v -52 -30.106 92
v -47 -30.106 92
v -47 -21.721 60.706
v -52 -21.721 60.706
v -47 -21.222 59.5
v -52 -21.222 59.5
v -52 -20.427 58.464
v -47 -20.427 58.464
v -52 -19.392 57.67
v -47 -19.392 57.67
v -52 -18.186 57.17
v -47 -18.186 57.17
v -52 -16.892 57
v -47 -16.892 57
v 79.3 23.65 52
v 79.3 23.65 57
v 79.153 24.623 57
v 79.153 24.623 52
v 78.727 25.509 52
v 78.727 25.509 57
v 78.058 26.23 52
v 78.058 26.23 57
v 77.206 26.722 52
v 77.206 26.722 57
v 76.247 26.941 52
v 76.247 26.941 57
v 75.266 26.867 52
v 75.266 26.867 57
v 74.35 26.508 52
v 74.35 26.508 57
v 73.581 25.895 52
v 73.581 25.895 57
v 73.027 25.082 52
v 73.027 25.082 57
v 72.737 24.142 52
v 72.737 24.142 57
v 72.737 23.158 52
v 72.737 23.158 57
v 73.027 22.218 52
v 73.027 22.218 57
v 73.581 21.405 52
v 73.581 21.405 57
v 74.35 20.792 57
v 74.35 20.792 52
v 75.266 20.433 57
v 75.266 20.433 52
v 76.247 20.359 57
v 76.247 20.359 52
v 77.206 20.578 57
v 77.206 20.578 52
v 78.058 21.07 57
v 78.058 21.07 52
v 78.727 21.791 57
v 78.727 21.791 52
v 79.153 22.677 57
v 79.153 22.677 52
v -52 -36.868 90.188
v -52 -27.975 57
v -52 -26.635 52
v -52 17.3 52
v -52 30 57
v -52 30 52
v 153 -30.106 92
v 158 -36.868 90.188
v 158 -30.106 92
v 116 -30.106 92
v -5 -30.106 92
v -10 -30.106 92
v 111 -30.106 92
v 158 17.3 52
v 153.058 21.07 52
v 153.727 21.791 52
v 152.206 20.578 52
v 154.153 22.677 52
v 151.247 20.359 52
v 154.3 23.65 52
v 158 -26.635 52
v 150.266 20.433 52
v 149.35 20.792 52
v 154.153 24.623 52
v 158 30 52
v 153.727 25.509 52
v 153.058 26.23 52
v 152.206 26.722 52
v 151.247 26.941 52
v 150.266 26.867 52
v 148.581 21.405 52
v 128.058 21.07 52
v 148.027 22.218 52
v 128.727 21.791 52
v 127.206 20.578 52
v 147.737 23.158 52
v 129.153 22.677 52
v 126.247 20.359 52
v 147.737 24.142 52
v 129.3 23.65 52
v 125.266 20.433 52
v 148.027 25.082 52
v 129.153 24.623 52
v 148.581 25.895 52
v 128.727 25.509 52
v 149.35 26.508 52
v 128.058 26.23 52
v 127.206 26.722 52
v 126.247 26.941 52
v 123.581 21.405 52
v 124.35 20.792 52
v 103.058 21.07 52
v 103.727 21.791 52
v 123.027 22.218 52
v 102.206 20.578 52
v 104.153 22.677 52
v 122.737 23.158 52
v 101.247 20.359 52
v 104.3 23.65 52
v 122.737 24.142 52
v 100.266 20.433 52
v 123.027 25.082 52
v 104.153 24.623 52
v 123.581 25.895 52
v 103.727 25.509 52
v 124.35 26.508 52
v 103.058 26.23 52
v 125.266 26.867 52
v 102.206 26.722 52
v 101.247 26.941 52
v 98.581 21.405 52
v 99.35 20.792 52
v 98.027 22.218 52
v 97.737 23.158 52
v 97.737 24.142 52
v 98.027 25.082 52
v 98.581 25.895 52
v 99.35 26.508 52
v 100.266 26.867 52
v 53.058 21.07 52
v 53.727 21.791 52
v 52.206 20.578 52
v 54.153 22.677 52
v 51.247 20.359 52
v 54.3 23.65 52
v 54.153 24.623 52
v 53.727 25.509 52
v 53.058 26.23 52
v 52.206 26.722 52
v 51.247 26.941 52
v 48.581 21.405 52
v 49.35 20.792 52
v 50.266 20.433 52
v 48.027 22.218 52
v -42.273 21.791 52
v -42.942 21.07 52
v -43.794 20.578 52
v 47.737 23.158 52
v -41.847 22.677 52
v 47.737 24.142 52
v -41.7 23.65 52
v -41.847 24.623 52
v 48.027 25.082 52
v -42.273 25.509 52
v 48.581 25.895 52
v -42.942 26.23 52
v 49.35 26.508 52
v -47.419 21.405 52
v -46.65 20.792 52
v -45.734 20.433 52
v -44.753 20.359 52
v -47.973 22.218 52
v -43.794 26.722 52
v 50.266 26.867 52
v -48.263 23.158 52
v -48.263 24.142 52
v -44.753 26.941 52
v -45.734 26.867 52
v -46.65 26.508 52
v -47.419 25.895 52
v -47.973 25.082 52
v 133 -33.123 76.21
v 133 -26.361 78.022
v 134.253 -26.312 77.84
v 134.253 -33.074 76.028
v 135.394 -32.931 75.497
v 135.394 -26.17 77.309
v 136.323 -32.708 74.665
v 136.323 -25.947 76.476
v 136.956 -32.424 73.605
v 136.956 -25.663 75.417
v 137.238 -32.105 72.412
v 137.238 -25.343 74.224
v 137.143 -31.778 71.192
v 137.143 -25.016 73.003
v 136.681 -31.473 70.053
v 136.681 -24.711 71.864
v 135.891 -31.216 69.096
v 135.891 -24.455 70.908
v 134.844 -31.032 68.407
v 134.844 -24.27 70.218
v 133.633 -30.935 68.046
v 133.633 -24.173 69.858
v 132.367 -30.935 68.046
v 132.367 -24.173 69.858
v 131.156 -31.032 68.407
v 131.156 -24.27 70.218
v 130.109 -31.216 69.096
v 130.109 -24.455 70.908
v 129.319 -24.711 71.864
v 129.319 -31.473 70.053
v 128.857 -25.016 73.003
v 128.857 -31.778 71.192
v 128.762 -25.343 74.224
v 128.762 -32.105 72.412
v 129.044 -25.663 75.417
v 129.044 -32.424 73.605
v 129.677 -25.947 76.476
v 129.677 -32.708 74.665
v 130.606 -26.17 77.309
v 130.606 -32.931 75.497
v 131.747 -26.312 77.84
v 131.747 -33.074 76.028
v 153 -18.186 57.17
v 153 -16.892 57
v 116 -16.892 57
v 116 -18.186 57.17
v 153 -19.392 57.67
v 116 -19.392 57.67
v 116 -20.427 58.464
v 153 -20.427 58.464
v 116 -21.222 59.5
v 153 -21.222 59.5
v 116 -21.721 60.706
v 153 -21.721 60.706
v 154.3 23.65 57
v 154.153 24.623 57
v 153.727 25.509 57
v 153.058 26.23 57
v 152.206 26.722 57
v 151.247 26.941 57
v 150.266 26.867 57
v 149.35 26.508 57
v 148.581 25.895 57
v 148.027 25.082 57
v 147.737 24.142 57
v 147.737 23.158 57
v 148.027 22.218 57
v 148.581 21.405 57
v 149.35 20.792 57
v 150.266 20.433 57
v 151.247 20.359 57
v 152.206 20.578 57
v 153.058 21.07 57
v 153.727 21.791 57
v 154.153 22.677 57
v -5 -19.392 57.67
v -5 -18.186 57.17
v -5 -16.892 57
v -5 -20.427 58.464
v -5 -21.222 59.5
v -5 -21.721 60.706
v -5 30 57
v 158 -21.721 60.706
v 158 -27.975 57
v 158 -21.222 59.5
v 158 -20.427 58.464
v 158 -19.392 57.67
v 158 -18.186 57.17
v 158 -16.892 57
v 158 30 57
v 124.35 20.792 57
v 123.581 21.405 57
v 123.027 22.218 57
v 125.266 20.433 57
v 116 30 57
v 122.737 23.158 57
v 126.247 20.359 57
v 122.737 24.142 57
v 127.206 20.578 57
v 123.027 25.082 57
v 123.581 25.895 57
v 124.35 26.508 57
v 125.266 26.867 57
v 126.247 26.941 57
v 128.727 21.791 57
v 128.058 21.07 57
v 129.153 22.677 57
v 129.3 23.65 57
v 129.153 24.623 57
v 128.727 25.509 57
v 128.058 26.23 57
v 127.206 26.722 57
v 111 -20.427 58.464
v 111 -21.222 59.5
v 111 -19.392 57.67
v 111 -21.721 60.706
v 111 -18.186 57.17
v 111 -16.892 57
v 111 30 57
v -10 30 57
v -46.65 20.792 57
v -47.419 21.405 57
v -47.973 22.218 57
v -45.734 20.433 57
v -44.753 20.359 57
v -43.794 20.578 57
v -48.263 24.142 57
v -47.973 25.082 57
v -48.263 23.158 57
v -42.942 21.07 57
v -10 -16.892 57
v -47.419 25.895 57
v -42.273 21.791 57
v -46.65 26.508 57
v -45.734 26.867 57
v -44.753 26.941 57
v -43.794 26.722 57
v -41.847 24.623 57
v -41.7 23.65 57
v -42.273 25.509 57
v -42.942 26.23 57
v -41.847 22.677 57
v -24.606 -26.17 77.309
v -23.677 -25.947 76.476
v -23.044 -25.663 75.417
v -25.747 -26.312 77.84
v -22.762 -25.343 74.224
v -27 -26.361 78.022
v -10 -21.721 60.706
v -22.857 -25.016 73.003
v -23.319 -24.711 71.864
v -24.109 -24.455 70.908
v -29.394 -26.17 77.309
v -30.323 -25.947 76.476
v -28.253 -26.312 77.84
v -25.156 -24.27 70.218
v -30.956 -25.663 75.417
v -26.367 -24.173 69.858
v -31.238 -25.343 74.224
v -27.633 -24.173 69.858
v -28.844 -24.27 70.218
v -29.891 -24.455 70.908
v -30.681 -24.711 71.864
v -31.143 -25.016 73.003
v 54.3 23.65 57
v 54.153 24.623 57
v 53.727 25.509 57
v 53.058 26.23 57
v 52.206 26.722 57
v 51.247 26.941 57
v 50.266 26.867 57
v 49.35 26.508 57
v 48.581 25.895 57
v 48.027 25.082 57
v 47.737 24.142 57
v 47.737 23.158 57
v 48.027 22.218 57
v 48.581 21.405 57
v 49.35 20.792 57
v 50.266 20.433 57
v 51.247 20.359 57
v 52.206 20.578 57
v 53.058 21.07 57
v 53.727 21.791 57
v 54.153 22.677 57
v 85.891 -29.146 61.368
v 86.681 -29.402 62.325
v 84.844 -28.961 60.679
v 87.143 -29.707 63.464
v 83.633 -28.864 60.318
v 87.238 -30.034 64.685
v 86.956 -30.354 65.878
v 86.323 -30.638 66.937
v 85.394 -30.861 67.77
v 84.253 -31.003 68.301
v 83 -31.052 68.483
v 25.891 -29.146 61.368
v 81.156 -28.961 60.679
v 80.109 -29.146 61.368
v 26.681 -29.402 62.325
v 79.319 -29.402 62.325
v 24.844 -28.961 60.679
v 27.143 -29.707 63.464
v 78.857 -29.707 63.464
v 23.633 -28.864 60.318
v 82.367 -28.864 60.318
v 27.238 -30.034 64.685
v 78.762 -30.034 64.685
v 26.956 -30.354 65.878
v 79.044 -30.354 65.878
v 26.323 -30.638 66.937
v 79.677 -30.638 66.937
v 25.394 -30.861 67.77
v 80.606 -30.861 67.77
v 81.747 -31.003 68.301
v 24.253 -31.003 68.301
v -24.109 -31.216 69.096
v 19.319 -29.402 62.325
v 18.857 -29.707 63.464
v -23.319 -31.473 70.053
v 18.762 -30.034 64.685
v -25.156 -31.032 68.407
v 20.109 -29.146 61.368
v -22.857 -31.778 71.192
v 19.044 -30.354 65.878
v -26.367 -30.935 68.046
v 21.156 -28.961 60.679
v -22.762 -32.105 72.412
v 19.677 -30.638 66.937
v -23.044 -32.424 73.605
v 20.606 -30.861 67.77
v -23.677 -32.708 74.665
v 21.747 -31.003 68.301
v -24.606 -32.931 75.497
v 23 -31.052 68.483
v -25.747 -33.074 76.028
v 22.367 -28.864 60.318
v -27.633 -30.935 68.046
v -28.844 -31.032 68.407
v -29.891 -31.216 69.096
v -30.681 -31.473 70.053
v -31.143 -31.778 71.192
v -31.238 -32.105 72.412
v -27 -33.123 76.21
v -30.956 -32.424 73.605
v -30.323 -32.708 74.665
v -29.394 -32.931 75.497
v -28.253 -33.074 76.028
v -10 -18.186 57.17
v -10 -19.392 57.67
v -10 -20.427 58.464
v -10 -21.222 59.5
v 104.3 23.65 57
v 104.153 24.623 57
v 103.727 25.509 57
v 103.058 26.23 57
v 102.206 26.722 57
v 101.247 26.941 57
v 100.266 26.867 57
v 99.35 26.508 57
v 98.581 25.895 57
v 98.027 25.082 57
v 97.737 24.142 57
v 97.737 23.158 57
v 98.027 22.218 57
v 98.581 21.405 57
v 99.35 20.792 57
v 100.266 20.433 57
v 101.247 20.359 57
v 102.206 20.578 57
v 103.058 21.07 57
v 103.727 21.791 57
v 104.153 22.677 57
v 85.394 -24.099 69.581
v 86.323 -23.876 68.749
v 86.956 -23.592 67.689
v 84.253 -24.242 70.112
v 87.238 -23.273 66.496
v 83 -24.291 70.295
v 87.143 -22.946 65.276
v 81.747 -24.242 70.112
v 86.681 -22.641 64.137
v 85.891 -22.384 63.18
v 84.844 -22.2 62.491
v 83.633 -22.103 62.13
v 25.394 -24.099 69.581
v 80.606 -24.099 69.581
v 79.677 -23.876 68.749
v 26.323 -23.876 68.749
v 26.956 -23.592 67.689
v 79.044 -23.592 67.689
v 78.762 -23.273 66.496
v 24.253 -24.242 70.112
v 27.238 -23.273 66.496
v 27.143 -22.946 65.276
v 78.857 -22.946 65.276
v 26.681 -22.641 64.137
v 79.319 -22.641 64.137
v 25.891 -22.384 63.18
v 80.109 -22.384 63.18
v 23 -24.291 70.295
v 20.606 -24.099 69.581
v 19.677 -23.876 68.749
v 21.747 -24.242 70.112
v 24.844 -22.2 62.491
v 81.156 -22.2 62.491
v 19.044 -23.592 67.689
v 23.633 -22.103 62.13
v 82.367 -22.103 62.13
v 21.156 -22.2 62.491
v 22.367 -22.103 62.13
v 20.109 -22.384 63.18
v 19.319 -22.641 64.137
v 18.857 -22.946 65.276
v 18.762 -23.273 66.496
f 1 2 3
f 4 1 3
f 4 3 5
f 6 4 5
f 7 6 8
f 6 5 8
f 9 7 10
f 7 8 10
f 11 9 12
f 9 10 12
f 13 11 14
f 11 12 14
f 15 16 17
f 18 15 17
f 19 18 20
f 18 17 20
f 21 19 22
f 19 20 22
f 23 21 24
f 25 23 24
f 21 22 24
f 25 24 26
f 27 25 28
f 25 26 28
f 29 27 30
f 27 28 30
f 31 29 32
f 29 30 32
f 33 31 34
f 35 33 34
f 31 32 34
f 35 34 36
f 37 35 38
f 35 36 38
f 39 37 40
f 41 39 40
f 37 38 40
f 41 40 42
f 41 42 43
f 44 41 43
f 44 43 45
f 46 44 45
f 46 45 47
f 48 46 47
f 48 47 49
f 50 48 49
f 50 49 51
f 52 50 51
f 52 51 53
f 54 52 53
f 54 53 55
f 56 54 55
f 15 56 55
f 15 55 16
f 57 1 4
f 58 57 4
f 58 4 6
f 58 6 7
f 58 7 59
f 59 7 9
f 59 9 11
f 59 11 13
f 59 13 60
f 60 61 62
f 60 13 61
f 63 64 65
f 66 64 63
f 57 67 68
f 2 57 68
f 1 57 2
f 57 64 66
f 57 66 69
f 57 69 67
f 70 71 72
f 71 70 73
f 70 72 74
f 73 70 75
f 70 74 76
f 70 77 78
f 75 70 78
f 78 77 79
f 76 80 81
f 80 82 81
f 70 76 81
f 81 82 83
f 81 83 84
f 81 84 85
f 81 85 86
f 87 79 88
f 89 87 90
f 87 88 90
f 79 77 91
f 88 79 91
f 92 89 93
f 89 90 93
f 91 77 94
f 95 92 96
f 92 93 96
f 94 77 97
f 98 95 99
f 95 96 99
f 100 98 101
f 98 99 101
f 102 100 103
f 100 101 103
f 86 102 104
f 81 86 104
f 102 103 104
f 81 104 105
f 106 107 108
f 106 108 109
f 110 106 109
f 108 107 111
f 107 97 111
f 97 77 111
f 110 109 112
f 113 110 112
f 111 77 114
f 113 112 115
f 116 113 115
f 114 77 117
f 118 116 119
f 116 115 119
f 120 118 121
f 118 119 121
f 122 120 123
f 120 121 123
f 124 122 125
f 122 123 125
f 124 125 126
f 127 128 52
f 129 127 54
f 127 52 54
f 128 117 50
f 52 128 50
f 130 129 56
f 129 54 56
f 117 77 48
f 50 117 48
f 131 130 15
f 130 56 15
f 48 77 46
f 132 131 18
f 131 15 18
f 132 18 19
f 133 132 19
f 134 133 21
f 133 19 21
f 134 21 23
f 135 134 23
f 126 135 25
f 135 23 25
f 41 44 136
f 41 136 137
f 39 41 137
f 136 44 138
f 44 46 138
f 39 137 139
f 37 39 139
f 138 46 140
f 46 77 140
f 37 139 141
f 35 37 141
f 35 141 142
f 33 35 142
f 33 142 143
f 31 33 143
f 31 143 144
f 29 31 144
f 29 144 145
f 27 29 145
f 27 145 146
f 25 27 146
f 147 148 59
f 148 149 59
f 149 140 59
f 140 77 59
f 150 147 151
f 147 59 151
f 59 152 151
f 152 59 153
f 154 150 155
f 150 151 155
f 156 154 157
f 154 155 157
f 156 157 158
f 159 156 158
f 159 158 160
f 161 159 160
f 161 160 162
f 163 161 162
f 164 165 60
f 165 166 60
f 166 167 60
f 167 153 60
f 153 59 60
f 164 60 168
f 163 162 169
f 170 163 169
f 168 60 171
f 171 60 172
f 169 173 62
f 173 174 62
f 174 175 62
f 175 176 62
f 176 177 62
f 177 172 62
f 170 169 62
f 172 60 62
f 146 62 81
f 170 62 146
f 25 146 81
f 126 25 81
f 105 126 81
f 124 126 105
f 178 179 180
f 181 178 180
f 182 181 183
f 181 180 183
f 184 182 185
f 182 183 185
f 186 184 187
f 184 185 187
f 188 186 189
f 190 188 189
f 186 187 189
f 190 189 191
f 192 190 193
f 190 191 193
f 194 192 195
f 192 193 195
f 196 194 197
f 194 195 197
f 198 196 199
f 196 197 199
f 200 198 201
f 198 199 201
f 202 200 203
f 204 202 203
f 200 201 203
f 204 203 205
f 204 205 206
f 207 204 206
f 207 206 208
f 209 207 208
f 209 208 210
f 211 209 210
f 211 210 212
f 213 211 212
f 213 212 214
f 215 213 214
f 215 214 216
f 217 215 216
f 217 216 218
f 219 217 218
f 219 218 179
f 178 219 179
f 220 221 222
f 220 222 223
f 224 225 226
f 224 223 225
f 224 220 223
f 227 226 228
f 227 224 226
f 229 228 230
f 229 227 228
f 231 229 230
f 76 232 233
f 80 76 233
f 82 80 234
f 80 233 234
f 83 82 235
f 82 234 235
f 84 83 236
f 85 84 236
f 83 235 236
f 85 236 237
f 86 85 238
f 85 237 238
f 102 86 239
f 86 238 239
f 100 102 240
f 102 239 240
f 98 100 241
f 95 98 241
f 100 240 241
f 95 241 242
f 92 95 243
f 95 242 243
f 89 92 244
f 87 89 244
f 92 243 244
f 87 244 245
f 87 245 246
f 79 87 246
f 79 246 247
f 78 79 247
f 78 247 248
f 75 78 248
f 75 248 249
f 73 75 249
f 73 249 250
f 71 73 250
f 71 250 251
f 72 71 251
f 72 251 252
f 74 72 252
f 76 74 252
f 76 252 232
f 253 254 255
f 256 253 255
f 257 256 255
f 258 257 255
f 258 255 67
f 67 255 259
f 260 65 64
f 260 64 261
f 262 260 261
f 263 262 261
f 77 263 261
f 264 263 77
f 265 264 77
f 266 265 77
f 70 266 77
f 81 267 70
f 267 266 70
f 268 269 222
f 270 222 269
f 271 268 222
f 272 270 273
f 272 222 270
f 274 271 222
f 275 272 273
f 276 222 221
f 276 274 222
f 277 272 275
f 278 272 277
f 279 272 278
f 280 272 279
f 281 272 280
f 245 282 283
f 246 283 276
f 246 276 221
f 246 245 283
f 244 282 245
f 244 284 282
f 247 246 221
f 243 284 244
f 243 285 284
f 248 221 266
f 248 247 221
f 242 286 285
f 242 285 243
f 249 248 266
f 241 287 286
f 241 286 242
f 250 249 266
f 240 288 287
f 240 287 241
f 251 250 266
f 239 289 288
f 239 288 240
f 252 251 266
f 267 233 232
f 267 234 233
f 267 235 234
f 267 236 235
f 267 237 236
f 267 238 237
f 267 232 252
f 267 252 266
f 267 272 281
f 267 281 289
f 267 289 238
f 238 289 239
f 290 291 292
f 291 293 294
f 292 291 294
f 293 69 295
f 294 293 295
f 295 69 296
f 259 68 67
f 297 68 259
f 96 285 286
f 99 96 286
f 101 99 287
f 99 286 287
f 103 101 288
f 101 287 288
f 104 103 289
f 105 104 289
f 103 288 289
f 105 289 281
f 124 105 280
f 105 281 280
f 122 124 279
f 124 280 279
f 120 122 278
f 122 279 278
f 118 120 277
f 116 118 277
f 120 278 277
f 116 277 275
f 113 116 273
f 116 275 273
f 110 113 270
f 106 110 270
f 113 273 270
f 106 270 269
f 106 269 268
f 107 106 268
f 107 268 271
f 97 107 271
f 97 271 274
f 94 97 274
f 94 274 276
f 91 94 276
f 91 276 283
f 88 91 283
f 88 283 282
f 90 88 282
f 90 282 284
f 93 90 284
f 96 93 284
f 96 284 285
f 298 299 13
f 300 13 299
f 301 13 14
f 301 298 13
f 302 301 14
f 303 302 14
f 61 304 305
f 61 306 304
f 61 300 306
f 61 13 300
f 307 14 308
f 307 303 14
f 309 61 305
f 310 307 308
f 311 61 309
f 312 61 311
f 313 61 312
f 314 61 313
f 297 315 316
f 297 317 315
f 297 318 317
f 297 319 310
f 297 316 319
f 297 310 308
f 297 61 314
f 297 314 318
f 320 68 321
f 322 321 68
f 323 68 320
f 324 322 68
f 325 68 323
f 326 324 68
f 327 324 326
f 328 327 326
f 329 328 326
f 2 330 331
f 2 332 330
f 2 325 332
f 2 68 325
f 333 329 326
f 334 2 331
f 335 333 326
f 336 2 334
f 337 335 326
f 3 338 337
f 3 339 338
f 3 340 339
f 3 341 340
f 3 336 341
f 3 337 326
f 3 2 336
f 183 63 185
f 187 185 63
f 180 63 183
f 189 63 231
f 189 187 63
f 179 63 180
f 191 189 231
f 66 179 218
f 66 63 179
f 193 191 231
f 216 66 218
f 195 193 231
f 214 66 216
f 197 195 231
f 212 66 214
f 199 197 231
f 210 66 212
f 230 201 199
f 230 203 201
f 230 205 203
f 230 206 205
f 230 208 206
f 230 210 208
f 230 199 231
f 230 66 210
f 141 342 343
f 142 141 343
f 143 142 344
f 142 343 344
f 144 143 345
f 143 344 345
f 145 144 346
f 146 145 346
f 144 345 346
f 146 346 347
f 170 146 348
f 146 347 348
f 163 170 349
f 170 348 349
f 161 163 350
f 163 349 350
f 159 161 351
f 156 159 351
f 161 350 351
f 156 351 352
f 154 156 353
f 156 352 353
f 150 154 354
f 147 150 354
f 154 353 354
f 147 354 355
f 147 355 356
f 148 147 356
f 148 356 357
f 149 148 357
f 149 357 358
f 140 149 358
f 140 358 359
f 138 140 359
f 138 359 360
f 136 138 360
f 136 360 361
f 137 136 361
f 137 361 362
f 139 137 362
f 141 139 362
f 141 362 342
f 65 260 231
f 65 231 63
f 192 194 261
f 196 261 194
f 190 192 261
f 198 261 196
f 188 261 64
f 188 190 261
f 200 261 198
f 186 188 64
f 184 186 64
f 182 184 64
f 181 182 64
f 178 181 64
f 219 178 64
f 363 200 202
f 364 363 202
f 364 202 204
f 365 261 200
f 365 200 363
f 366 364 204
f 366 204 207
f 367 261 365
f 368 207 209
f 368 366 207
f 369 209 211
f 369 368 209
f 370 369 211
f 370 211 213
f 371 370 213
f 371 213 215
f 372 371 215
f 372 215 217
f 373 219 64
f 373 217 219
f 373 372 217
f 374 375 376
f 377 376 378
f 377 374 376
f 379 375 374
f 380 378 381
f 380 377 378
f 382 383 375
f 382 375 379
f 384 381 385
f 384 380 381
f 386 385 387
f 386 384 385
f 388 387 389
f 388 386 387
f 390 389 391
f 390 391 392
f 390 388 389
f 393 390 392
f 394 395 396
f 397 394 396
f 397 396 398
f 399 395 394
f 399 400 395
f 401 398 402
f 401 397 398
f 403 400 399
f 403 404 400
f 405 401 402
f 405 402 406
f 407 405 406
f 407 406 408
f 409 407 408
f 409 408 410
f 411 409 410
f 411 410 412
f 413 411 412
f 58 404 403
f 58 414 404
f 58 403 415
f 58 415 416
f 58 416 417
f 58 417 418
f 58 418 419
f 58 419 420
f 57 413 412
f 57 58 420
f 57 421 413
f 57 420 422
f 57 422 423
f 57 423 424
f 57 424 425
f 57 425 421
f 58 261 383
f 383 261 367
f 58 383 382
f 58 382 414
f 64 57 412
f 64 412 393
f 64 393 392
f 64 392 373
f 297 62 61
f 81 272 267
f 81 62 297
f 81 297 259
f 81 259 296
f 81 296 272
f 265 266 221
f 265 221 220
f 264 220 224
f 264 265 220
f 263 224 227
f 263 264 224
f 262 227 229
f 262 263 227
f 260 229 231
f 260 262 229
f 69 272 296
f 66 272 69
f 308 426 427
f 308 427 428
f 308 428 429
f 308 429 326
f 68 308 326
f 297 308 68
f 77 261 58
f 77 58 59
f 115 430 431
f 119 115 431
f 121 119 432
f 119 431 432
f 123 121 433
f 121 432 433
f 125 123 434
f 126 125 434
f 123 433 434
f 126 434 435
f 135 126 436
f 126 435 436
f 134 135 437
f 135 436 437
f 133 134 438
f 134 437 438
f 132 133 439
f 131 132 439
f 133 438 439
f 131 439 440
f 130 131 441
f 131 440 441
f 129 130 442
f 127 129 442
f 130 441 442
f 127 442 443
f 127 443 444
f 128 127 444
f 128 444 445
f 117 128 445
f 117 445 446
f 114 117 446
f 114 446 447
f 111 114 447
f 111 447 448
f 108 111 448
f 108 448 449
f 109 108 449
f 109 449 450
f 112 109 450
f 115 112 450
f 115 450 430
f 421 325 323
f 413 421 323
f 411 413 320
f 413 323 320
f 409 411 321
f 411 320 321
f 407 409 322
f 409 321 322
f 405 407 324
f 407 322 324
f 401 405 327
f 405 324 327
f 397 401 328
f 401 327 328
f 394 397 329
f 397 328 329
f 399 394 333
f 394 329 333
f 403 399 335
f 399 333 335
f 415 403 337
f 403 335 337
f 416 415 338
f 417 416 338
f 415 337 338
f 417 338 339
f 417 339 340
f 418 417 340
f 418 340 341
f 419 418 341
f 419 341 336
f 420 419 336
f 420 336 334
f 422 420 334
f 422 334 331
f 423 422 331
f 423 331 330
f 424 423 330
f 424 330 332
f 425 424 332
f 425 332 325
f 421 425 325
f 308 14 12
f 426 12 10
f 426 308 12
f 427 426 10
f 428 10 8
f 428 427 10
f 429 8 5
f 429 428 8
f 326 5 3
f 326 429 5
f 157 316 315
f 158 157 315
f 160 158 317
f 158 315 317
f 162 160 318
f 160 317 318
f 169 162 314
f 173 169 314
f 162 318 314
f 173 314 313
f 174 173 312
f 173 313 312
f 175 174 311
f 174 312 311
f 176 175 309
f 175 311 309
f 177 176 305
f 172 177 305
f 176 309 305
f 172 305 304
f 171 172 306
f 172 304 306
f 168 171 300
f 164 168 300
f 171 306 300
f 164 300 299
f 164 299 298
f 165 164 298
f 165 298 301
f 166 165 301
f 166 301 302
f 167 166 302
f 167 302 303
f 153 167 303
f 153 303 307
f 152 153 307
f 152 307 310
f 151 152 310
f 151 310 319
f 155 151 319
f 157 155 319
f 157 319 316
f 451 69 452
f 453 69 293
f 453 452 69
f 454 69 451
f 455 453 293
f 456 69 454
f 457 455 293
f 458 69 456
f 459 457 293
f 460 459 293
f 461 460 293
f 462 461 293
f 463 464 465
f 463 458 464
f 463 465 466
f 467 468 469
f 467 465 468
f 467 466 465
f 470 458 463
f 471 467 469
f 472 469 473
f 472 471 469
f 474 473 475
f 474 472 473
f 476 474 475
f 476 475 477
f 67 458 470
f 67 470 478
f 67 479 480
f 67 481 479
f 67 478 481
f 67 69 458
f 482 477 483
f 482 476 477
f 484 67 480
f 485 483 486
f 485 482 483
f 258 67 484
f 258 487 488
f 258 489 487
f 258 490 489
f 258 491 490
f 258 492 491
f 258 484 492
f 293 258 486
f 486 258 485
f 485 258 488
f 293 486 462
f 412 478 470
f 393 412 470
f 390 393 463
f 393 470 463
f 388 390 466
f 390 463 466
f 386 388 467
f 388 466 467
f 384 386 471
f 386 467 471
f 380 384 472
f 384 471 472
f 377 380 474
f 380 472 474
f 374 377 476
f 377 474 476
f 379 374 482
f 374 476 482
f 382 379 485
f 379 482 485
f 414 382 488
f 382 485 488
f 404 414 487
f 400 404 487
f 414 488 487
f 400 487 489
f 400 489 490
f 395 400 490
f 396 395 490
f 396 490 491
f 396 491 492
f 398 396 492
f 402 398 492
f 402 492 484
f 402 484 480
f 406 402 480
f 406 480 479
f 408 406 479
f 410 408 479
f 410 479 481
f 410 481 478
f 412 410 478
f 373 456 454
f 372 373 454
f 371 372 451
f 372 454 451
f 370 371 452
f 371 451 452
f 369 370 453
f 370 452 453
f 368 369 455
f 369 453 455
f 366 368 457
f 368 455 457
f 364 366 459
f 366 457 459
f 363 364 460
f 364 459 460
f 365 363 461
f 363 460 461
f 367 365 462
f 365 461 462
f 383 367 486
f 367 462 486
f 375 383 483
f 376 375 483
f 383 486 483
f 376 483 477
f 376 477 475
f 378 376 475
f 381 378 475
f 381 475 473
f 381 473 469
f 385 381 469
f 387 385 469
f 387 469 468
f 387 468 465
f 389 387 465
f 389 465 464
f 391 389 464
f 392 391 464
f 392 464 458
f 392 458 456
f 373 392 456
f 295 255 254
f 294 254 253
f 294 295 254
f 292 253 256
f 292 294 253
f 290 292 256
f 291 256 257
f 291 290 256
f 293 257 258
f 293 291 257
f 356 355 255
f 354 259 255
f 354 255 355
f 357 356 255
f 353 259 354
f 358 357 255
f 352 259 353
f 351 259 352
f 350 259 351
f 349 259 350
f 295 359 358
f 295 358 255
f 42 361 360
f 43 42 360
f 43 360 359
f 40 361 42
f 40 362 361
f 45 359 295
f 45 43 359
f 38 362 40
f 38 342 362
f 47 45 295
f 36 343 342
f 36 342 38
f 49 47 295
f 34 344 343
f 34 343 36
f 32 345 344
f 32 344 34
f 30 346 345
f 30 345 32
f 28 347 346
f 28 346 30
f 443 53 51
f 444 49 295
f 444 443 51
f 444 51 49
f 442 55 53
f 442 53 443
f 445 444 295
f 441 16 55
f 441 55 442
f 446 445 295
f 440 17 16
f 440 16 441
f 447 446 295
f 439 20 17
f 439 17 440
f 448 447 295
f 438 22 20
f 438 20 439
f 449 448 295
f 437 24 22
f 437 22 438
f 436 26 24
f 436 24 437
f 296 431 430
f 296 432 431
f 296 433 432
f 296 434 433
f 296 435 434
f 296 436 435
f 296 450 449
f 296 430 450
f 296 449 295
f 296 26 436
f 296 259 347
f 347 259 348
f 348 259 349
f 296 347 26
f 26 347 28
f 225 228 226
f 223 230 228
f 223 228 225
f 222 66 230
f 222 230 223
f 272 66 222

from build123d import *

# Parameters (mm, degrees)
EXTRUDE_1_DEPTH      = 30
SKETCH_2_R           = 44.45
CUT_EXTRUDE_1_DEPTH  = 4
SKETCH_3_R           = 25.5
SKETCH_3_R_2         = 2.25
CUT_EXTRUDE_2_DEPTH  = 188.619295383
CUT_EXTRUDE_3_DEPTH  = 189.215302247
SKETCH_5_R           = 1.65
CUT_EXTRUDE_4_DEPTH  = 189.215302247
EXTRUDE_START        = -30
EXTRUDE_2_DEPTH      = 30
CUT_EXTRUDE_5_DEPTH  = 198.040604952
CUT_EXTRUDE_7_DEPTH  = 233.432785983
CUT_EXTRUDE_8_DEPTH  = 233.432785983
CUT_EXTRUDE_9_DEPTH  = 233.432785983
FILLET_1_R           = 5
CUT_EXTRUDE_10_DEPTH = 233.432785983
EXTRUDE_START_2      = -5
EXTRUDE_3_DEPTH      = 5
EXTRUDE_4_DEPTH      = 5
SKETCH_14_R          = 4.25
CUT_EXTRUDE_11_DEPTH = 189.364728478
SKETCH_16_W          = 43
SKETCH_16_H          = 30
CUT_EXTRUDE_12_DEPTH = 233.432785983
EXTRUDE_7_REACH      = 188.592
SKETCH_18_W          = 210
SKETCH_18_H          = 5
EXTRUDE_8_DEPTH      = 210
EXTRUDE_9_DEPTH      = 5
EXTRUDE_10_DEPTH     = 5
SKETCH_22_R          = 4.25
CUT_EXTRUDE_13_DEPTH = 187.984035343
FILLET_2_R           = 5
SKETCH_23_W          = 158.512158041
SKETCH_23_H          = 103.317713915
CUT_EXTRUDE_14_DEPTH = 234.418610938
EXTRUDE_11_DEPTH     = 2.5
EXTRUDE_12_DEPTH     = 2.5
CUT_EXTRUDE_15_DEPTH = 5
CUT_EXTRUDE_START    = -5
CUT_EXTRUDE_16_DEPTH = 5
SKETCH_24_R          = 3.3
CUT_EXTRUDE_17_DEPTH = 166.976648756


with BuildPart() as part:
    # 草图1 → 凸台-拉伸1 (new body)
    with BuildSketch(Plane(origin=(0, 0, 0), x_dir=(1, 0, 0), z_dir=(0, 1, 0))):
        with BuildLine():
            Line((170, 31.93), (170, -31.93))
            ThreePointArc((170, -31.93), (167.781993847, -38.210172909), (162.111885646, -41.704453387))
            Line((162.111885646, -41.704453387), (15.839142344, -73.308400404))
            ThreePointArc((15.839142344, -73.308400404), (-75, 0), (15.839142344, 73.308400404))
            Line((15.839142344, 73.308400404), (162.111885646, 41.704453387))
            ThreePointArc((162.111885646, 41.704453387), (167.781993847, 38.210172909), (170, 31.93))
        make_face()
    extrude(amount=EXTRUDE_1_DEPTH)

    # 草图2 → 切除-拉伸1 (cut)
    with BuildSketch(Plane(origin=(0, 30, 0), x_dir=(1, 0, 0), z_dir=(0, 1, 0))):
        with Locations(Location((0, 0, 0), (0, 0, 270))):
            Circle(SKETCH_2_R)
    extrude(amount=-CUT_EXTRUDE_1_DEPTH, mode=Mode.SUBTRACT)

    # 草图3 → 切除-拉伸2 (cut, through all)
    with BuildSketch(Plane(origin=(0, 26, 0), x_dir=(1, 0, 0), z_dir=(0, 1, 0))):
        with Locations(Location((0, 0, 0), (0, 0, 270))):
            Circle(SKETCH_3_R)
        with Locations(Location((0, 41, 0), (0, 0, 270))):
            Circle(SKETCH_3_R_2)
        with Locations(Location((28.991378029, 28.991378029, 0), (0, 0, 270))):
            Circle(SKETCH_3_R_2)
        with Locations(Location((41, 0, 0), (0, 0, 270))):
            Circle(SKETCH_3_R_2)
        with Locations(Location((28.991378029, -28.991378029, 0), (0, 0, 270))):
            Circle(SKETCH_3_R_2)
        with Locations(Location((0, -41, 0), (0, 0, 270))):
            Circle(SKETCH_3_R_2)
        with Locations(Location((-28.991378029, -28.991378029, 0), (0, 0, 270))):
            Circle(SKETCH_3_R_2)
        with Locations(Location((-41, 0, 0), (0, 0, 270))):
            Circle(SKETCH_3_R_2)
        with Locations(Location((-28.991378029, 28.991378029, 0), (0, 0, 270))):
            Circle(SKETCH_3_R_2)
    extrude(amount=-CUT_EXTRUDE_2_DEPTH, mode=Mode.SUBTRACT)

    # 草图4 → 切除-拉伸3 (cut, through all)
    with BuildSketch(Plane(origin=(0, 30, 0), x_dir=(1, 0, 0), z_dir=(0, 1, 0))):
        with BuildLine():
            Line((124, 18.5), (134, 18.5))
            ThreePointArc((134, 18.5), (152.5, 0), (134, -18.5))
            Line((134, -18.5), (124, -18.5))
            ThreePointArc((124, -18.5), (105.5, 0), (124, 18.5))
        make_face()
    extrude(amount=-CUT_EXTRUDE_3_DEPTH, mode=Mode.SUBTRACT)

    # 草图5 → 切除-拉伸4 (cut, through all)
    with BuildSketch(Plane(origin=(0, 30, 0), x_dir=(1, 0, 0), z_dir=(0, 1, 0))):
        with Locations(Location((116.75, 25.5, 0), (0, 0, 270))):
            Circle(SKETCH_5_R)
        with Locations(Location((141.25, 25.5, 0), (0, 0, 270))):
            Circle(SKETCH_5_R)
        with Locations(Location((141.25, -25.5, 0), (0, 0, 270))):
            Circle(SKETCH_5_R)
        with Locations(Location((116.75, -25.5, 0), (0, 0, 270))):
            Circle(SKETCH_5_R)
    extrude(amount=-CUT_EXTRUDE_4_DEPTH, mode=Mode.SUBTRACT)

    # 草图6 → 凸台-拉伸2 (add)
    with BuildSketch(Plane(origin=(0, 30, 0), x_dir=(1, 0, 0), z_dir=(0, 1, 0)).offset(EXTRUDE_START)):
        with BuildLine():
            Line((158, 95), (-52, 95))
            Line((-52, 95), (-52, 54.046276467))
            ThreePointArc((-52, 54.046276467), (-20.48558667, 72.148047366), (15.839142344, 73.308400404))
            Line((15.839142344, 73.308400404), (158, 42.592874655))
            Line((158, 42.592874655), (158, 95))
        make_face()
        with BuildLine():
            ThreePointArc((15.839142344, -73.308400404), (-20.48558667, -72.148047366), (-52, -54.046276467))
            Line((-52, -54.046276467), (-52, -95))
            Line((-52, -95), (158, -95))
            Line((158, -95), (158, -42.592874655))
            Line((158, -42.592874655), (15.839142344, -73.308400404))
        make_face()
    extrude(amount=EXTRUDE_2_DEPTH)

    # 草图7 → 切除-拉伸5 (cut, through all)
    with BuildSketch(Plane(origin=(0, 30, 0), x_dir=(1, 0, 0), z_dir=(0, 1, 0))):
        with BuildLine():
            Line((-52, 54.046276467), (-52, -54.046276467))
            ThreePointArc((-52, -54.046276467), (-75, 0), (-52, 54.046276467))
        make_face()
        with BuildLine():
            Line((158, 42.592874655), (158, -42.592874655))
            Line((158, -42.592874655), (162.111885646, -41.704453387))
            ThreePointArc((162.111885646, -41.704453387), (167.781993847, -38.210172909), (170, -31.93))
            Line((170, -31.93), (170, 31.93))
            ThreePointArc((170, 31.93), (167.781993847, 38.210172909), (162.111885646, 41.704453387))
            Line((162.111885646, 41.704453387), (158, 42.592874655))
        make_face()
    extrude(amount=-CUT_EXTRUDE_5_DEPTH, mode=Mode.SUBTRACT)

    # 草图9 → 切除-拉伸7 (cut, through all)
    with BuildSketch(Plane.ZY.offset(52)):
        Polygon((-95, 20), (-60, 10.621778265), (-60, 30), (-95, 30), align=None)
    extrude(amount=-CUT_EXTRUDE_7_DEPTH, mode=Mode.SUBTRACT)

    # 草图10 → 切除-拉伸8 (cut, through all)
    with BuildSketch(Plane.ZY.offset(52)):
        Polygon((-95, 12.753066737), (-52, 1.231251463), (-52, 0), (-95, 0), align=None)
    extrude(amount=-CUT_EXTRUDE_8_DEPTH, mode=Mode.SUBTRACT)

    # 草图8 → 切除-拉伸9 (cut, through all)
    with BuildSketch(Plane.ZY.offset(52)):
        Polygon((0, 0), (52, 0), (52, 17.3), (-52, 17.3), (-52, 0), align=None)
    extrude(amount=-CUT_EXTRUDE_9_DEPTH, mode=Mode.SUBTRACT)

    # 圆角1
    fillet_1_edges = [part.edges().sort_by_distance(p)[0] for p in [
        (53, 10.621778265, -60),
    ]]
    fillet(fillet_1_edges, radius=FILLET_1_R)

    # 草图11 → 切除-拉伸10 (cut, through all)
    with BuildSketch(Plane.ZY.offset(52)):
        Polygon((-95, 12.753066737), (-93.188266684, 19.514547521), (-95, 20), align=None)
    extrude(amount=-CUT_EXTRUDE_10_DEPTH, mode=Mode.SUBTRACT)

    # 草图12 → 凸台-拉伸3 (add)
    with BuildSketch(Plane.ZY.offset(52).offset(EXTRUDE_START_2)):
        with BuildLine():
            Line((-93.188266684, 19.514547521), (-60, 30))
            Line((-60, 30), (-60, 17.137905129))
            ThreePointArc((-60, 17.137905129), (-61.956192855, 13.171138428), (-66.294095226, 12.308275998))
            Line((-66.294095226, 12.308275998), (-93.188266684, 19.514547521))
        make_face()
    extrude(amount=EXTRUDE_3_DEPTH)

    # 草图13 → 凸台-拉伸4 (add)
    with BuildSketch(Plane(origin=(158, 0, 0), x_dir=(0, 0, -1), z_dir=(1, 0, 0))):
        with BuildLine():
            Line((66.294095226, 12.308275998), (93.188266684, 19.514547521))
            Line((93.188266684, 19.514547521), (60, 30))
            Line((60, 30), (60, 17.137905129))
            ThreePointArc((60, 17.137905129), (61.956192855, 13.171138428), (66.294095226, 12.308275998))
        make_face()
    extrude(amount=-EXTRUDE_4_DEPTH)

    # 草图14 → 切除-拉伸11 (cut, through all)
    with BuildSketch(Plane(origin=(0, -5.089745962, -1.36379332), x_dir=(1, 0, 0), z_dir=(0, 0.9659258262890681, 0.2588190451025214))):
        with Locations(Location((-27, 82.063690052, 0), (0, 0, 270))):
            Circle(SKETCH_14_R)
        with Locations(Location((23, 82.063690052, 0), (0, 0, 270))):
            Circle(SKETCH_14_R)
        with Locations(Location((83, 82.063690052, 0), (0, 0, 270))):
            Circle(SKETCH_14_R)
        with Locations(Location((133, 82.063690052, 0), (0, 0, 270))):
            Circle(SKETCH_14_R)
    extrude(amount=-CUT_EXTRUDE_11_DEPTH, mode=Mode.SUBTRACT)

    # 草图16 → 切除-拉伸12 (cut, through all)
    with BuildSketch(Plane.ZY.offset(52)):
        with Locations((73.5, 15)):
            Rectangle(SKETCH_16_W, SKETCH_16_H)
    extrude(amount=-CUT_EXTRUDE_12_DEPTH, mode=Mode.SUBTRACT)

    # 凸台-拉伸7: up to this plane
    extrude_7_end = Plane(origin=(0, -11.851226746, -3.175526636), z_dir=(0, -0.9659258262890681, -0.25881904510252146))
    # 草图18 → 凸台-拉伸7 (add, up to the surface)
    with BuildSketch(Plane(origin=(0, 30, 0), x_dir=(1, 0, 0), z_dir=(0, 1, 0)), mode=Mode.PRIVATE) as extrude_7_sk1:
        with Locations((53, -54.5)):
            Rectangle(SKETCH_18_W, SKETCH_18_H)
    extrude_7_tool1 = split(extrude(extrude_7_sk1.sketch, amount=-EXTRUDE_7_REACH, mode=Mode.PRIVATE), bisect_by=extrude_7_end, keep=Keep.BOTH, mode=Mode.PRIVATE)
    add(extrude_7_tool1.solids().sort_by_distance((53, 30, 54.5))[0])

    # 草图19 → 凸台-拉伸8 (add)
    with BuildSketch(Plane.ZY.offset(52)):
        Polygon((57, -27.975210512), (90.188266684, -36.867979769), (92, -30.106498985), (57, -20.72827725), align=None)
    extrude(amount=-EXTRUDE_8_DEPTH)

    # 草图20 → 凸台-拉伸9 (add)
    with BuildSketch(Plane.ZY.offset(52)):
        Polygon((92, -30.106498985), (57, -20.72827725), (57, 30), align=None)
    extrude(amount=-EXTRUDE_9_DEPTH)

    # 草图21 → 凸台-拉伸10 (add)
    with BuildSketch(Plane(origin=(158, 0, 0), x_dir=(0, 0, -1), z_dir=(1, 0, 0))):
        Polygon((-57, 30), (-92, -30.106498985), (-57, -20.72827725), align=None)
    extrude(amount=-EXTRUDE_10_DEPTH)

    # 草图22 → 切除-拉伸13 (cut, through all)
    with BuildSketch(Plane(origin=(0, -5.089745962, -1.36379332), x_dir=(1, 0, 0), z_dir=(0, 0.9659258262890686, 0.25881904510251946))):
        with Locations(Location((-27, -77.936309948, 0), (0, 0, 270))):
            Circle(SKETCH_22_R)
        with Locations(Location((23, -69.936309948, 0), (0, 0, 270))):
            Circle(SKETCH_22_R)
        with Locations(Location((83, -69.936309948, 0), (0, 0, 270))):
            Circle(SKETCH_22_R)
        with Locations(Location((133, -77.936309948, 0), (0, 0, 270))):
            Circle(SKETCH_22_R)
    extrude(amount=-CUT_EXTRUDE_13_DEPTH, mode=Mode.SUBTRACT)

    # 圆角2
    fillet_2_edges = [part.edges().sort_by_distance(p)[0] for p in [
        (53, -20.72827725, 57),
    ]]
    fillet(fillet_2_edges, radius=FILLET_2_R)

    # 草图23 → 切除-拉伸14 (cut, through all)
    with BuildSketch(Plane.ZY.offset(52)):
        with Locations((-27.256079021, 5.306767281)):
            Rectangle(SKETCH_23_W, SKETCH_23_H)
    extrude(amount=-CUT_EXTRUDE_14_DEPTH, mode=Mode.SUBTRACT)

    # 草图25 → 凸台-拉伸11 (add, symmetric)
    with BuildSketch(Plane(origin=(113.5, 0, 0), x_dir=(0, 0, -1), z_dir=(1, 0, 0))):
        with BuildLine():
            Line((-57, -16.89164231), (-57, 30))
            Line((-57, 30), (-92, -30.106498985))
            Line((-92, -30.106498985), (-60.705904774, -21.721271441))
            ThreePointArc((-60.705904774, -21.721271441), (-58.033233299, -19.935449455), (-57, -16.89164231))
        make_face()
    extrude(amount=EXTRUDE_11_DEPTH, both=True)

    # 草图26 → 凸台-拉伸12 (add, symmetric)
    with BuildSketch(Plane.ZY.offset(7.5)):
        with BuildLine():
            Line((60.705904774, -21.721271441), (92, -30.106498985))
            Line((92, -30.106498985), (57, 30))
            Line((57, 30), (57, -16.89164231))
            ThreePointArc((57, -16.89164231), (58.033233299, -19.935449455), (60.705904774, -21.721271441))
        make_face()
    extrude(amount=EXTRUDE_12_DEPTH, both=True)

    # 草图27 → 切除-拉伸15 (cut)
    with BuildSketch(Plane(origin=(-47, 0, 0), x_dir=(0, 0, -1), z_dir=(1, 0, 0))):
        with BuildLine():
            Line((-92, -30.106498985), (-60.705904774, -21.721271441))
            ThreePointArc((-60.705904774, -21.721271441), (-58.033233299, -19.935449455), (-57, -16.89164231))
            Line((-57, -16.89164231), (-57, 30))
            Line((-57, 30), (-92, -30.106498985))
        make_face()
    extrude(amount=-CUT_EXTRUDE_15_DEPTH, mode=Mode.SUBTRACT)

    # 草图28 → 切除-拉伸16 (cut)
    with BuildSketch(Plane.ZY.offset(-153).offset(CUT_EXTRUDE_START)):
        with BuildLine():
            Line((57, 30), (57, -16.89164231))
            ThreePointArc((57, -16.89164231), (58.033233299, -19.935449455), (60.705904774, -21.721271441))
            Line((60.705904774, -21.721271441), (92, -30.106498985))
            Line((92, -30.106498985), (57, 30))
        make_face()
    extrude(amount=CUT_EXTRUDE_16_DEPTH, mode=Mode.SUBTRACT)

    # 草图24 → 切除-拉伸17 (cut, through all)
    with BuildSketch(Plane.XY.offset(57)):
        with Locations((-45, 23.65)):
            Circle(SKETCH_24_R)
        with Locations((151, 23.65)):
            Circle(SKETCH_24_R)
        with Locations((126, 23.65)):
            Circle(SKETCH_24_R)
        with Locations((101, 23.65)):
            Circle(SKETCH_24_R)
        with Locations((76, 23.65)):
            Circle(SKETCH_24_R)
        with Locations((51, 23.65)):
            Circle(SKETCH_24_R)
    extrude(amount=-CUT_EXTRUDE_17_DEPTH, mode=Mode.SUBTRACT)


solid = part.part
